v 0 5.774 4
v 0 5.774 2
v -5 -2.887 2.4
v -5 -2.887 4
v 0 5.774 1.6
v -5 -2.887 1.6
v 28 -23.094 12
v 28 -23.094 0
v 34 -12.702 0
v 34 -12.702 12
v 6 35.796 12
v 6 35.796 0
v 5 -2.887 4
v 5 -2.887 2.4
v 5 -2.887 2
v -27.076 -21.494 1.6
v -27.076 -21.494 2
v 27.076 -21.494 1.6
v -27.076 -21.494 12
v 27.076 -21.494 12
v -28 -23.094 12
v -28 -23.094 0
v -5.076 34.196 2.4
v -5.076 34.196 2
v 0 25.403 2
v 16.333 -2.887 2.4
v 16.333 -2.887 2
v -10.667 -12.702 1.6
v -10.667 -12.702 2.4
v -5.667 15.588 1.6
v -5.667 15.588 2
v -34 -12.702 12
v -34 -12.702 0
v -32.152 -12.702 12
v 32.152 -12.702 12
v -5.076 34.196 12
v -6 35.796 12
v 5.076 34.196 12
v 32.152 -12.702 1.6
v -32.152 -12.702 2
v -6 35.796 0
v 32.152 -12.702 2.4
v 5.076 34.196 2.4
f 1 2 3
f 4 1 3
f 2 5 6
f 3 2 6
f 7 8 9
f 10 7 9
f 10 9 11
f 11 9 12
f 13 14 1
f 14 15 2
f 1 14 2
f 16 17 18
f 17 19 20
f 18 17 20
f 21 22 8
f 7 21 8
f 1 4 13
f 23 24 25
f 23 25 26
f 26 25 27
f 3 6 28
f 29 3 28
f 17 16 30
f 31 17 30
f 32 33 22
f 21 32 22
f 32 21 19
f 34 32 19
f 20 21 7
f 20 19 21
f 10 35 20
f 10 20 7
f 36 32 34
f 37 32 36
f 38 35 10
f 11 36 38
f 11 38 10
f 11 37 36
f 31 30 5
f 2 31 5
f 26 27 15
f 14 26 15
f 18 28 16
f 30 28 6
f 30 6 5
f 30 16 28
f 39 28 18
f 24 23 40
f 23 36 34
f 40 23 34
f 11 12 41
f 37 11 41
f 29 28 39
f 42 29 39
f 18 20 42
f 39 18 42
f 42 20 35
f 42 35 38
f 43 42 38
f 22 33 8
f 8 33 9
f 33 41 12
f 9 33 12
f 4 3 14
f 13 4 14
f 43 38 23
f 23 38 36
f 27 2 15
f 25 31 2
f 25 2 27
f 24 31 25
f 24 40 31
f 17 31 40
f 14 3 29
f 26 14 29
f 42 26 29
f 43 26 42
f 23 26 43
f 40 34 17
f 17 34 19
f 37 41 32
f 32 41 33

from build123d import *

# Parameters (mm, degrees)
F4_DEPTH  = 12
F6_DEPTH  = 10.4
F8_DEPTH  = 2.4
F10_DEPTH = 0.4
F12_DEPTH = 0.8


with BuildPart() as f4:
    # F3 (on Top) → F4 (new body)
    with BuildSketch(Plane.XY):
        Polygon((-28, -23.0940107676), (28, -23.0940107676), (34, -12.7017059222), (6, 35.7957166898), (-6, 35.7957166898), (-34, -12.7017059222), align=None)
    extrude(amount=F4_DEPTH)

    # F5 (on face) → F6 (cut)
    with BuildSketch(Plane.XY.offset(12)):
        Polygon((32.1524791386, -12.7017059222), (5.0762395693, 34.1957166898), (-5.0762395693, 34.1957166898), (-32.1524791386, -12.7017059222), (-27.0762395693, -21.4940107676), (27.0762395693, -21.4940107676), align=None)
    extrude(amount=-F6_DEPTH, mode=Mode.SUBTRACT)

    # F7 (on face) → F8 (join)
    with BuildSketch(Plane.XY.offset(1.6)):
        Polygon((-5, -2.8867513459), (5, -2.8867513459), (0, 5.7735026919), align=None)
    extrude(amount=F8_DEPTH)

    # F9 (on face) → F10 (join)
    with BuildSketch(Plane.XY.offset(1.6)):
        Polygon((0, 25.4034118443), (-5.0762395693, 34.1957166898), (-32.1524791386, -12.7017059222), (-27.0762395693, -21.4940107676), (-5.6666666667, 15.5884572681), align=None)
        Polygon((16.3333333333, -2.8867513459), (0, 25.4034118443), (-5.6666666667, 15.5884572681), (0, 5.7735026919), (5, -2.8867513459), align=None)
    extrude(amount=F10_DEPTH)

    # F11 (on face) → F12 (join)
    with BuildSketch(Plane.XY.offset(1.6)):
        Polygon((-10.6666666667, -12.7017059222), (32.1524791386, -12.7017059222), (5.0762395693, 34.1957166898), (-5.0762395693, 34.1957166898), (16.3333333333, -2.8867513459), (-5, -2.8867513459), align=None)
    extrude(amount=F12_DEPTH)


solid = f4.part
